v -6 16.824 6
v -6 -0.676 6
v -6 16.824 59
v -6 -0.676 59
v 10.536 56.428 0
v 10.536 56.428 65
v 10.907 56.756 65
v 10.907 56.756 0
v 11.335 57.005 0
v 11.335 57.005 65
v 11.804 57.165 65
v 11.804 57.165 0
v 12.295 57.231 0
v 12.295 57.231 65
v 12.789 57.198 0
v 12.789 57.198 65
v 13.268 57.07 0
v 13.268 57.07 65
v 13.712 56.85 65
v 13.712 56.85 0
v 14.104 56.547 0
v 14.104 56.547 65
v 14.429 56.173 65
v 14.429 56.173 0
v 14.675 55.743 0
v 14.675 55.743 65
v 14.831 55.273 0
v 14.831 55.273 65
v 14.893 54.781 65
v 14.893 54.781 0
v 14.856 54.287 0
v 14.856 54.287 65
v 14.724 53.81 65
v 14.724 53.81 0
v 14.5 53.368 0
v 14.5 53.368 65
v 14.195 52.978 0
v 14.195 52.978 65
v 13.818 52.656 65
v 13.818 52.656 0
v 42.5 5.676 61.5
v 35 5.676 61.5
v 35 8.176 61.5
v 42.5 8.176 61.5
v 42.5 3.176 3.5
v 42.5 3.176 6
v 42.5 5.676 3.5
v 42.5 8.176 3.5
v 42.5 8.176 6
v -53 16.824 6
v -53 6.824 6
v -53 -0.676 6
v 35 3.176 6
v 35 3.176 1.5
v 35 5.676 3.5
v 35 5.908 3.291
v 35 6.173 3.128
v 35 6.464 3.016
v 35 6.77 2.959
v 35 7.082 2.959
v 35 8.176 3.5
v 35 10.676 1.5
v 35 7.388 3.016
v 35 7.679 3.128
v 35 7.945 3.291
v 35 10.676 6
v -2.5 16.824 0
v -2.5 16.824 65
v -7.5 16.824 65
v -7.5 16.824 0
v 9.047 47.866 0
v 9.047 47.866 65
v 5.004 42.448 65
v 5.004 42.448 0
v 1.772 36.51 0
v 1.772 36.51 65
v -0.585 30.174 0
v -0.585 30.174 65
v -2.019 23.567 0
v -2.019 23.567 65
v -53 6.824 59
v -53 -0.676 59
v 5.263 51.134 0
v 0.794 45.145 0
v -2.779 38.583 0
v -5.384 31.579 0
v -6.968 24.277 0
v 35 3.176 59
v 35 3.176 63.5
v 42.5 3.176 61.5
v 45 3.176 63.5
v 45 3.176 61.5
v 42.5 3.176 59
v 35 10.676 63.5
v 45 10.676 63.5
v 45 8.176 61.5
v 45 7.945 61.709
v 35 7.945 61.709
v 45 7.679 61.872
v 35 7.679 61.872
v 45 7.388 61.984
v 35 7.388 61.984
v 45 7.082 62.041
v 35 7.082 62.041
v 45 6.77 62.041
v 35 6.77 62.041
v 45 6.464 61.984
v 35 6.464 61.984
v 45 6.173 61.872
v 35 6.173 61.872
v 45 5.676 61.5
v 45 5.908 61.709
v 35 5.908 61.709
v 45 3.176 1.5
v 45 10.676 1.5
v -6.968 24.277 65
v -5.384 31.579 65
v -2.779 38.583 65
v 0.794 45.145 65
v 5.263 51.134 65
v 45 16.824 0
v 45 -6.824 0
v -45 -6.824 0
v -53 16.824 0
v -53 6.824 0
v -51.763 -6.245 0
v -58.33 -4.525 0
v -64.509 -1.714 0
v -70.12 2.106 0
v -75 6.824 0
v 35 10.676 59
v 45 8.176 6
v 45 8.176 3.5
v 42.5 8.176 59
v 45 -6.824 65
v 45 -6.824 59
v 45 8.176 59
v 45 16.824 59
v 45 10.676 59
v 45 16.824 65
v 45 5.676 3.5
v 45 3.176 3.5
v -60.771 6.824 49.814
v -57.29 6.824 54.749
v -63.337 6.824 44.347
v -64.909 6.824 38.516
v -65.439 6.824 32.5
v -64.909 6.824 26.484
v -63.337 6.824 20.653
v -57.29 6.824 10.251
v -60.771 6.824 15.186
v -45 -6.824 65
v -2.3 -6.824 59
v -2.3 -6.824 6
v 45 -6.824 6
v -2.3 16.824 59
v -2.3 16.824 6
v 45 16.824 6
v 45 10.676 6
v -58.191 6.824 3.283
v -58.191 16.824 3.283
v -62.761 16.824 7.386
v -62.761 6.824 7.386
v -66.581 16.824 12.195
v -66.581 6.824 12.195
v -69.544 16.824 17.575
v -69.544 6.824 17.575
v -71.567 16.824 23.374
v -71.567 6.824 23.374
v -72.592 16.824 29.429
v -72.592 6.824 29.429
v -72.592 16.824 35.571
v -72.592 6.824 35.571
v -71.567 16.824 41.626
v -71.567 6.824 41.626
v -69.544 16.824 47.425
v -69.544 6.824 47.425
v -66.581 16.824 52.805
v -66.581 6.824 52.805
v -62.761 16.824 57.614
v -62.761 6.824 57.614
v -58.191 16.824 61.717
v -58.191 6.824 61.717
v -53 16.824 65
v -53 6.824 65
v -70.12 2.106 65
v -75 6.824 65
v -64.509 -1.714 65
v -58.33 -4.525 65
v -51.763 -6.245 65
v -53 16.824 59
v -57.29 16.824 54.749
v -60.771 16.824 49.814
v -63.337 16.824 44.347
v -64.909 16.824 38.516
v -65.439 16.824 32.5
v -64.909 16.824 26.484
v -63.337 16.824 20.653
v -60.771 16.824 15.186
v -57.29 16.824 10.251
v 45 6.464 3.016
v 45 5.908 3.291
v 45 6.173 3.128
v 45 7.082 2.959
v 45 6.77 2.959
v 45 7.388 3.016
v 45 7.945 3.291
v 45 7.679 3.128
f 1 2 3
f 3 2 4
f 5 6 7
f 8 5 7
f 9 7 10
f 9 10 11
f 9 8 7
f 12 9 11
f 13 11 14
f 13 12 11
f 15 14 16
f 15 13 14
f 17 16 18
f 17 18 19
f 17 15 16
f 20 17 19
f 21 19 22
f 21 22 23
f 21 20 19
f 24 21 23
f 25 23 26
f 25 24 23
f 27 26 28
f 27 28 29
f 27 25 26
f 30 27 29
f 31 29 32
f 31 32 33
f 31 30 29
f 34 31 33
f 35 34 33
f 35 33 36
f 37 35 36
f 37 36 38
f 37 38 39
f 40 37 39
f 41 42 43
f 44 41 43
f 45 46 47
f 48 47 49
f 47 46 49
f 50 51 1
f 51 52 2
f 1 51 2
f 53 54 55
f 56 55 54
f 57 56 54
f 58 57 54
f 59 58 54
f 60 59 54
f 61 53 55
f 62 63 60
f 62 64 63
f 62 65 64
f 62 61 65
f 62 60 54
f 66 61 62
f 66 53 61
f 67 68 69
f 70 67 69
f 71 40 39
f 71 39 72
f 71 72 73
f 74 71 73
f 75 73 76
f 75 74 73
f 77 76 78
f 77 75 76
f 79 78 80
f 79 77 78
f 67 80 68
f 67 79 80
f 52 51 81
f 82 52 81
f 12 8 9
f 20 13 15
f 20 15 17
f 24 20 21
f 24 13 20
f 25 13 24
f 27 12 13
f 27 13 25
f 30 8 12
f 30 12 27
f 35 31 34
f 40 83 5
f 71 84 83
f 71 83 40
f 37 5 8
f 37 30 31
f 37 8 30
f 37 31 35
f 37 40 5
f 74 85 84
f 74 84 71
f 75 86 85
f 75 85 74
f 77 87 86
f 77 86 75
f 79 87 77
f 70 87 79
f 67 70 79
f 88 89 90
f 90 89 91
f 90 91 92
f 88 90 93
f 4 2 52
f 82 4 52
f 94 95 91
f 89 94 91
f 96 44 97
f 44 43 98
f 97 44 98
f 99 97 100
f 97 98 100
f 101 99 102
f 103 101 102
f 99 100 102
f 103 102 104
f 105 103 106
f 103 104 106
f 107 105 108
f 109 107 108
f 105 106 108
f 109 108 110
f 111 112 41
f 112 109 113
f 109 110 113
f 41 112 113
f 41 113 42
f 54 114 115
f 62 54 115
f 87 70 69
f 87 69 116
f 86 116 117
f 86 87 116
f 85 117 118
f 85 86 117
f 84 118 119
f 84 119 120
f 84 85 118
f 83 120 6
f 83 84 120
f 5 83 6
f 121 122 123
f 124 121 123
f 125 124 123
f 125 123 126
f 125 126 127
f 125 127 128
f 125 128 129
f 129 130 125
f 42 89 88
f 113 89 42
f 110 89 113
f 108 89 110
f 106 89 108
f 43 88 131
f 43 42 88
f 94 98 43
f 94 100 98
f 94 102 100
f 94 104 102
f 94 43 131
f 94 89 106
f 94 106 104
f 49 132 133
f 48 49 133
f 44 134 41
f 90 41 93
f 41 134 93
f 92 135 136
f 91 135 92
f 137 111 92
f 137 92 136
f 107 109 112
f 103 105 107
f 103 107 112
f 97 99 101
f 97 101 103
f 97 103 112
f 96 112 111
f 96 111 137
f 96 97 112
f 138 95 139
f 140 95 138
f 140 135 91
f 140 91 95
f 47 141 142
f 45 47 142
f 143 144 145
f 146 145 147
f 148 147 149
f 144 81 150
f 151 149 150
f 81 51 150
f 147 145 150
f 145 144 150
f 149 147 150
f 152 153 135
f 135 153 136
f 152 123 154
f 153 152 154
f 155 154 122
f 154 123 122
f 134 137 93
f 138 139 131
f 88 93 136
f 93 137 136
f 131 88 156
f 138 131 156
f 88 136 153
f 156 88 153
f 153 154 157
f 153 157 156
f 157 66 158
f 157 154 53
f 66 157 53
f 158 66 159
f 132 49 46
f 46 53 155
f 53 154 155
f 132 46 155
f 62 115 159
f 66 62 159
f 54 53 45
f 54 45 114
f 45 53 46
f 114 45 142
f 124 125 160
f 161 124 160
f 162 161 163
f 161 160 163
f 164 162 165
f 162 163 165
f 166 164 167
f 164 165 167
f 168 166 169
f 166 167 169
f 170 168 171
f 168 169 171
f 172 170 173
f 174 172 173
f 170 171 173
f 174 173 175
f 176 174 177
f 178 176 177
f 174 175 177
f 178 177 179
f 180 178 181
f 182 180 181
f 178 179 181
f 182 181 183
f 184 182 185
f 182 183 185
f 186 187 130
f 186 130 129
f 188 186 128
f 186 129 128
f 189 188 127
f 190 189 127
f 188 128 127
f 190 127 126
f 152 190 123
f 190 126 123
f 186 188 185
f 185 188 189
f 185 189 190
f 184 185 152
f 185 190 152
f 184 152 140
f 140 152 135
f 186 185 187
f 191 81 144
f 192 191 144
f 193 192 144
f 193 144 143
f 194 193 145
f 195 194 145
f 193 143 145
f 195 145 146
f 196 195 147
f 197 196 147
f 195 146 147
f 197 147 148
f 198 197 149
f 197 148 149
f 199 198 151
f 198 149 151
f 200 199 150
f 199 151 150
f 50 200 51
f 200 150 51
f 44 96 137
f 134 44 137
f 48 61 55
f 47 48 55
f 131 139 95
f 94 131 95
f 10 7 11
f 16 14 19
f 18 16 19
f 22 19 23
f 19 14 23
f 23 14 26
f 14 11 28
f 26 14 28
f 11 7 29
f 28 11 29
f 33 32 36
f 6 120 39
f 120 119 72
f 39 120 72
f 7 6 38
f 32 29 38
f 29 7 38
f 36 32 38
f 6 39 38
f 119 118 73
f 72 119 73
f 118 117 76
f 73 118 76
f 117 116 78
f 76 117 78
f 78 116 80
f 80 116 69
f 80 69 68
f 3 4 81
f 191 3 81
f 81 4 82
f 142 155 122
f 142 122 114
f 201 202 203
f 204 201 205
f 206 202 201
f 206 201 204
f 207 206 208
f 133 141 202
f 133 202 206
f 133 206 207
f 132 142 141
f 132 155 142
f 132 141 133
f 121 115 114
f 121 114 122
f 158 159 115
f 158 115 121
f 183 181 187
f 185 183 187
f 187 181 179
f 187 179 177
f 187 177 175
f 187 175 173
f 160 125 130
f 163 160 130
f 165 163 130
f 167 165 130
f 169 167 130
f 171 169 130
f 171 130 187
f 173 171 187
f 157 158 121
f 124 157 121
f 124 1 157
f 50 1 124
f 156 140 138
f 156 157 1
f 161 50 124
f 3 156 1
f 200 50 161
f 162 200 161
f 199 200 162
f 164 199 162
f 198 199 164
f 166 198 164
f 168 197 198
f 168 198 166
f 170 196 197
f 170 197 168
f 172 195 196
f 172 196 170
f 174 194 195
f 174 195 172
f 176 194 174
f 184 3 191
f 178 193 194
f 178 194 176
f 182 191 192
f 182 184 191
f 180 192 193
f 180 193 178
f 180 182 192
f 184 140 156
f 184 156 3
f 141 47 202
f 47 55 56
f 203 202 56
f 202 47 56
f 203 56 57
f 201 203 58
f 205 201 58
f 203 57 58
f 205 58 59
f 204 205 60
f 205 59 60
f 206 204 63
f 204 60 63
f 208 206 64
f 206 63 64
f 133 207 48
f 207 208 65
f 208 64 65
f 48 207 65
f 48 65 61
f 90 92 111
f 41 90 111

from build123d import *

# Parameters (mm, degrees)
F1_DEPTH  = 65
F2_W      = 45
F2_H      = 53
F3_DEPTH  = 13.648540618
F4_W      = 53
F4_H      = 53
F5_DEPTH  = 7.5
F7_DEPTH  = 10
F9_DEPTH  = 10
F10_W     = 7.5
F10_H     = 5
F11_DEPTH = 3
F13_DEPTH = 10
F14_W     = 7.5
F14_H     = 5
F15_DEPTH = 3
F17_DEPTH = 10
F19_DEPTH = 10
F20_W     = 6
F20_H     = 53
F21_DEPTH = 17.5
F23_DEPTH = 65
F24_W     = 2.3
F24_H     = 53
F25_DEPTH = 25


with BuildPart() as f1:
    # F0 (on Top) → F1 (new body)
    with BuildSketch(Plane.XY):
        with BuildLine():
            Line((45, -6.823770309), (45, 6.823770309))
            Line((45, 6.823770309), (-45, 6.823770309))
            Line((-45, 6.823770309), (-75, 6.823770309))
            ThreePointArc((-75, 6.823770309), (-61.4791941924, -3.2515620956), (-45, -6.823770309))
            Line((-45, -6.823770309), (45, -6.823770309))
        make_face()
    extrude(amount=F1_DEPTH)

    # F2 (on face) → F3 (cut, through all)
    with BuildSketch(Plane(origin=(0, 6.823770309, 0), x_dir=(-1, 0, 0), z_dir=(0, 1, 0))):
        with Locations((-22.5, 32.5)):
            Rectangle(F2_W, F2_H)
    extrude(amount=-F3_DEPTH, mode=Mode.SUBTRACT)

    # F4 (on face) → F5 (cut)
    with BuildSketch(Plane(origin=(0, 6.823770309, 0), x_dir=(-1, 0, 0), z_dir=(0, 1, 0))):
        with Locations((26.5, 32.5)):
            Rectangle(F4_W, F4_H)
    extrude(amount=-F5_DEPTH, mode=Mode.SUBTRACT)

    # F6 (on face) → F7 (join)
    with BuildSketch(Plane(origin=(0, 6.823770309, 0), x_dir=(-1, 0, 0), z_dir=(0, 1, 0))):
        with BuildLine():
            Line((53, 65), (-45, 65))
            Line((-45, 65), (-45, 59))
            Line((-45, 59), (53, 59))
            ThreePointArc((53, 59), (65.4386821775, 32.5), (53, 6))
            Line((53, 6), (-45, 6))
            Line((-45, 6), (-45, 0))
            Line((-45, 0), (53, 0))
            ThreePointArc((53, 0), (72.7213830352, 32.5), (53, 65))
        make_face()
    extrude(amount=F7_DEPTH)

    # F8 (on face) → F9 (cut)
    with BuildSketch(Plane.YZ.offset(45)):
        Polygon((8.176229691, 59), (10.676229691, 59), (10.676229691, 63.5), (3.176229691, 63.5), (3.176229691, 61.5), (8.176229691, 61.5), align=None)
    extrude(amount=-F9_DEPTH, mode=Mode.SUBTRACT)

    # F10 (on face) → F11 (cut)
    with BuildSketch(Plane(origin=(0, 0, 59), x_dir=(1, 0, 0), z_dir=(0, 0, -1))):
        with Locations((38.75, -5.676229691)):
            Rectangle(F10_W, F10_H)
    extrude(amount=-F11_DEPTH, mode=Mode.SUBTRACT)

    # F12 (on face) → F13 (cut)
    with BuildSketch(Plane.YZ.offset(45)):
        Polygon((10.676229691, 1.5), (10.676229691, 6), (8.176229691, 6), (8.176229691, 3.5), (3.176229691, 3.5), (3.176229691, 1.5), align=None)
    extrude(amount=-F13_DEPTH, mode=Mode.SUBTRACT)

    # F14 (on face) → F15 (cut)
    with BuildSketch(Plane.XY.offset(6)):
        with Locations((38.75, 5.676229691)):
            Rectangle(F14_W, F14_H)
    extrude(amount=-F15_DEPTH, mode=Mode.SUBTRACT)

    # F16 (on face) → F17 (join)
    with BuildSketch(Plane.YZ.offset(35)):
        with BuildLine():
            Line((8.176229691, 3.5), (5.676229691, 3.5))
            ThreePointArc((5.676229691, 3.5), (6.926229691, 2.9521718622), (8.176229691, 3.5))
        make_face()
    extrude(amount=F17_DEPTH)

    # F18 (on face) → F19 (join)
    with BuildSketch(Plane.YZ.offset(35)):
        with BuildLine():
            Line((5.676229691, 61.5), (8.176229691, 61.5))
            ThreePointArc((8.176229691, 61.5), (6.926229691, 62.0478281378), (5.676229691, 61.5))
        make_face()
    extrude(amount=F19_DEPTH)

    # F20 (on face) → F21 (join)
    with BuildSketch(Plane(origin=(0, -0.676229691, 0), x_dir=(-1, 0, 0), z_dir=(0, 1, 0))):
        with Locations((3, 32.5)):
            Rectangle(F20_W, F20_H)
    extrude(amount=F21_DEPTH)

    # F24 (on face) → F25 (cut)
    with BuildSketch(Plane.XZ.offset(6.823770309)):
        with Locations((-1.15, 32.5)):
            Rectangle(F24_W, F24_H)
    extrude(amount=-F25_DEPTH, mode=Mode.SUBTRACT)


with BuildPart() as f23:
    # F22 (on face) → F23 (new body)
    with BuildSketch(Plane(origin=(0, 0, 0), x_dir=(1, 0, 0), z_dir=(0, 0, -1))):
        with BuildLine():
            ThreePointArc((13.8182450683, -52.6559926707), (1.7716333916, -36.5102712772), (-2.5, -16.823770309))
            Line((-2.5, -16.823770309), (-7.5, -16.823770309))
            ThreePointArc((-7.5, -16.823770309), (-2.7787209882, -38.582534537), (10.5359550755, -56.4278055509))
            ThreePointArc((10.5359550755, -56.4278055509), (14.2757822044, -56.3682048106), (13.8182450683, -52.6559926707))
        make_face()
    extrude(amount=-F23_DEPTH)


solid = Compound([f1.part, f23.part])
